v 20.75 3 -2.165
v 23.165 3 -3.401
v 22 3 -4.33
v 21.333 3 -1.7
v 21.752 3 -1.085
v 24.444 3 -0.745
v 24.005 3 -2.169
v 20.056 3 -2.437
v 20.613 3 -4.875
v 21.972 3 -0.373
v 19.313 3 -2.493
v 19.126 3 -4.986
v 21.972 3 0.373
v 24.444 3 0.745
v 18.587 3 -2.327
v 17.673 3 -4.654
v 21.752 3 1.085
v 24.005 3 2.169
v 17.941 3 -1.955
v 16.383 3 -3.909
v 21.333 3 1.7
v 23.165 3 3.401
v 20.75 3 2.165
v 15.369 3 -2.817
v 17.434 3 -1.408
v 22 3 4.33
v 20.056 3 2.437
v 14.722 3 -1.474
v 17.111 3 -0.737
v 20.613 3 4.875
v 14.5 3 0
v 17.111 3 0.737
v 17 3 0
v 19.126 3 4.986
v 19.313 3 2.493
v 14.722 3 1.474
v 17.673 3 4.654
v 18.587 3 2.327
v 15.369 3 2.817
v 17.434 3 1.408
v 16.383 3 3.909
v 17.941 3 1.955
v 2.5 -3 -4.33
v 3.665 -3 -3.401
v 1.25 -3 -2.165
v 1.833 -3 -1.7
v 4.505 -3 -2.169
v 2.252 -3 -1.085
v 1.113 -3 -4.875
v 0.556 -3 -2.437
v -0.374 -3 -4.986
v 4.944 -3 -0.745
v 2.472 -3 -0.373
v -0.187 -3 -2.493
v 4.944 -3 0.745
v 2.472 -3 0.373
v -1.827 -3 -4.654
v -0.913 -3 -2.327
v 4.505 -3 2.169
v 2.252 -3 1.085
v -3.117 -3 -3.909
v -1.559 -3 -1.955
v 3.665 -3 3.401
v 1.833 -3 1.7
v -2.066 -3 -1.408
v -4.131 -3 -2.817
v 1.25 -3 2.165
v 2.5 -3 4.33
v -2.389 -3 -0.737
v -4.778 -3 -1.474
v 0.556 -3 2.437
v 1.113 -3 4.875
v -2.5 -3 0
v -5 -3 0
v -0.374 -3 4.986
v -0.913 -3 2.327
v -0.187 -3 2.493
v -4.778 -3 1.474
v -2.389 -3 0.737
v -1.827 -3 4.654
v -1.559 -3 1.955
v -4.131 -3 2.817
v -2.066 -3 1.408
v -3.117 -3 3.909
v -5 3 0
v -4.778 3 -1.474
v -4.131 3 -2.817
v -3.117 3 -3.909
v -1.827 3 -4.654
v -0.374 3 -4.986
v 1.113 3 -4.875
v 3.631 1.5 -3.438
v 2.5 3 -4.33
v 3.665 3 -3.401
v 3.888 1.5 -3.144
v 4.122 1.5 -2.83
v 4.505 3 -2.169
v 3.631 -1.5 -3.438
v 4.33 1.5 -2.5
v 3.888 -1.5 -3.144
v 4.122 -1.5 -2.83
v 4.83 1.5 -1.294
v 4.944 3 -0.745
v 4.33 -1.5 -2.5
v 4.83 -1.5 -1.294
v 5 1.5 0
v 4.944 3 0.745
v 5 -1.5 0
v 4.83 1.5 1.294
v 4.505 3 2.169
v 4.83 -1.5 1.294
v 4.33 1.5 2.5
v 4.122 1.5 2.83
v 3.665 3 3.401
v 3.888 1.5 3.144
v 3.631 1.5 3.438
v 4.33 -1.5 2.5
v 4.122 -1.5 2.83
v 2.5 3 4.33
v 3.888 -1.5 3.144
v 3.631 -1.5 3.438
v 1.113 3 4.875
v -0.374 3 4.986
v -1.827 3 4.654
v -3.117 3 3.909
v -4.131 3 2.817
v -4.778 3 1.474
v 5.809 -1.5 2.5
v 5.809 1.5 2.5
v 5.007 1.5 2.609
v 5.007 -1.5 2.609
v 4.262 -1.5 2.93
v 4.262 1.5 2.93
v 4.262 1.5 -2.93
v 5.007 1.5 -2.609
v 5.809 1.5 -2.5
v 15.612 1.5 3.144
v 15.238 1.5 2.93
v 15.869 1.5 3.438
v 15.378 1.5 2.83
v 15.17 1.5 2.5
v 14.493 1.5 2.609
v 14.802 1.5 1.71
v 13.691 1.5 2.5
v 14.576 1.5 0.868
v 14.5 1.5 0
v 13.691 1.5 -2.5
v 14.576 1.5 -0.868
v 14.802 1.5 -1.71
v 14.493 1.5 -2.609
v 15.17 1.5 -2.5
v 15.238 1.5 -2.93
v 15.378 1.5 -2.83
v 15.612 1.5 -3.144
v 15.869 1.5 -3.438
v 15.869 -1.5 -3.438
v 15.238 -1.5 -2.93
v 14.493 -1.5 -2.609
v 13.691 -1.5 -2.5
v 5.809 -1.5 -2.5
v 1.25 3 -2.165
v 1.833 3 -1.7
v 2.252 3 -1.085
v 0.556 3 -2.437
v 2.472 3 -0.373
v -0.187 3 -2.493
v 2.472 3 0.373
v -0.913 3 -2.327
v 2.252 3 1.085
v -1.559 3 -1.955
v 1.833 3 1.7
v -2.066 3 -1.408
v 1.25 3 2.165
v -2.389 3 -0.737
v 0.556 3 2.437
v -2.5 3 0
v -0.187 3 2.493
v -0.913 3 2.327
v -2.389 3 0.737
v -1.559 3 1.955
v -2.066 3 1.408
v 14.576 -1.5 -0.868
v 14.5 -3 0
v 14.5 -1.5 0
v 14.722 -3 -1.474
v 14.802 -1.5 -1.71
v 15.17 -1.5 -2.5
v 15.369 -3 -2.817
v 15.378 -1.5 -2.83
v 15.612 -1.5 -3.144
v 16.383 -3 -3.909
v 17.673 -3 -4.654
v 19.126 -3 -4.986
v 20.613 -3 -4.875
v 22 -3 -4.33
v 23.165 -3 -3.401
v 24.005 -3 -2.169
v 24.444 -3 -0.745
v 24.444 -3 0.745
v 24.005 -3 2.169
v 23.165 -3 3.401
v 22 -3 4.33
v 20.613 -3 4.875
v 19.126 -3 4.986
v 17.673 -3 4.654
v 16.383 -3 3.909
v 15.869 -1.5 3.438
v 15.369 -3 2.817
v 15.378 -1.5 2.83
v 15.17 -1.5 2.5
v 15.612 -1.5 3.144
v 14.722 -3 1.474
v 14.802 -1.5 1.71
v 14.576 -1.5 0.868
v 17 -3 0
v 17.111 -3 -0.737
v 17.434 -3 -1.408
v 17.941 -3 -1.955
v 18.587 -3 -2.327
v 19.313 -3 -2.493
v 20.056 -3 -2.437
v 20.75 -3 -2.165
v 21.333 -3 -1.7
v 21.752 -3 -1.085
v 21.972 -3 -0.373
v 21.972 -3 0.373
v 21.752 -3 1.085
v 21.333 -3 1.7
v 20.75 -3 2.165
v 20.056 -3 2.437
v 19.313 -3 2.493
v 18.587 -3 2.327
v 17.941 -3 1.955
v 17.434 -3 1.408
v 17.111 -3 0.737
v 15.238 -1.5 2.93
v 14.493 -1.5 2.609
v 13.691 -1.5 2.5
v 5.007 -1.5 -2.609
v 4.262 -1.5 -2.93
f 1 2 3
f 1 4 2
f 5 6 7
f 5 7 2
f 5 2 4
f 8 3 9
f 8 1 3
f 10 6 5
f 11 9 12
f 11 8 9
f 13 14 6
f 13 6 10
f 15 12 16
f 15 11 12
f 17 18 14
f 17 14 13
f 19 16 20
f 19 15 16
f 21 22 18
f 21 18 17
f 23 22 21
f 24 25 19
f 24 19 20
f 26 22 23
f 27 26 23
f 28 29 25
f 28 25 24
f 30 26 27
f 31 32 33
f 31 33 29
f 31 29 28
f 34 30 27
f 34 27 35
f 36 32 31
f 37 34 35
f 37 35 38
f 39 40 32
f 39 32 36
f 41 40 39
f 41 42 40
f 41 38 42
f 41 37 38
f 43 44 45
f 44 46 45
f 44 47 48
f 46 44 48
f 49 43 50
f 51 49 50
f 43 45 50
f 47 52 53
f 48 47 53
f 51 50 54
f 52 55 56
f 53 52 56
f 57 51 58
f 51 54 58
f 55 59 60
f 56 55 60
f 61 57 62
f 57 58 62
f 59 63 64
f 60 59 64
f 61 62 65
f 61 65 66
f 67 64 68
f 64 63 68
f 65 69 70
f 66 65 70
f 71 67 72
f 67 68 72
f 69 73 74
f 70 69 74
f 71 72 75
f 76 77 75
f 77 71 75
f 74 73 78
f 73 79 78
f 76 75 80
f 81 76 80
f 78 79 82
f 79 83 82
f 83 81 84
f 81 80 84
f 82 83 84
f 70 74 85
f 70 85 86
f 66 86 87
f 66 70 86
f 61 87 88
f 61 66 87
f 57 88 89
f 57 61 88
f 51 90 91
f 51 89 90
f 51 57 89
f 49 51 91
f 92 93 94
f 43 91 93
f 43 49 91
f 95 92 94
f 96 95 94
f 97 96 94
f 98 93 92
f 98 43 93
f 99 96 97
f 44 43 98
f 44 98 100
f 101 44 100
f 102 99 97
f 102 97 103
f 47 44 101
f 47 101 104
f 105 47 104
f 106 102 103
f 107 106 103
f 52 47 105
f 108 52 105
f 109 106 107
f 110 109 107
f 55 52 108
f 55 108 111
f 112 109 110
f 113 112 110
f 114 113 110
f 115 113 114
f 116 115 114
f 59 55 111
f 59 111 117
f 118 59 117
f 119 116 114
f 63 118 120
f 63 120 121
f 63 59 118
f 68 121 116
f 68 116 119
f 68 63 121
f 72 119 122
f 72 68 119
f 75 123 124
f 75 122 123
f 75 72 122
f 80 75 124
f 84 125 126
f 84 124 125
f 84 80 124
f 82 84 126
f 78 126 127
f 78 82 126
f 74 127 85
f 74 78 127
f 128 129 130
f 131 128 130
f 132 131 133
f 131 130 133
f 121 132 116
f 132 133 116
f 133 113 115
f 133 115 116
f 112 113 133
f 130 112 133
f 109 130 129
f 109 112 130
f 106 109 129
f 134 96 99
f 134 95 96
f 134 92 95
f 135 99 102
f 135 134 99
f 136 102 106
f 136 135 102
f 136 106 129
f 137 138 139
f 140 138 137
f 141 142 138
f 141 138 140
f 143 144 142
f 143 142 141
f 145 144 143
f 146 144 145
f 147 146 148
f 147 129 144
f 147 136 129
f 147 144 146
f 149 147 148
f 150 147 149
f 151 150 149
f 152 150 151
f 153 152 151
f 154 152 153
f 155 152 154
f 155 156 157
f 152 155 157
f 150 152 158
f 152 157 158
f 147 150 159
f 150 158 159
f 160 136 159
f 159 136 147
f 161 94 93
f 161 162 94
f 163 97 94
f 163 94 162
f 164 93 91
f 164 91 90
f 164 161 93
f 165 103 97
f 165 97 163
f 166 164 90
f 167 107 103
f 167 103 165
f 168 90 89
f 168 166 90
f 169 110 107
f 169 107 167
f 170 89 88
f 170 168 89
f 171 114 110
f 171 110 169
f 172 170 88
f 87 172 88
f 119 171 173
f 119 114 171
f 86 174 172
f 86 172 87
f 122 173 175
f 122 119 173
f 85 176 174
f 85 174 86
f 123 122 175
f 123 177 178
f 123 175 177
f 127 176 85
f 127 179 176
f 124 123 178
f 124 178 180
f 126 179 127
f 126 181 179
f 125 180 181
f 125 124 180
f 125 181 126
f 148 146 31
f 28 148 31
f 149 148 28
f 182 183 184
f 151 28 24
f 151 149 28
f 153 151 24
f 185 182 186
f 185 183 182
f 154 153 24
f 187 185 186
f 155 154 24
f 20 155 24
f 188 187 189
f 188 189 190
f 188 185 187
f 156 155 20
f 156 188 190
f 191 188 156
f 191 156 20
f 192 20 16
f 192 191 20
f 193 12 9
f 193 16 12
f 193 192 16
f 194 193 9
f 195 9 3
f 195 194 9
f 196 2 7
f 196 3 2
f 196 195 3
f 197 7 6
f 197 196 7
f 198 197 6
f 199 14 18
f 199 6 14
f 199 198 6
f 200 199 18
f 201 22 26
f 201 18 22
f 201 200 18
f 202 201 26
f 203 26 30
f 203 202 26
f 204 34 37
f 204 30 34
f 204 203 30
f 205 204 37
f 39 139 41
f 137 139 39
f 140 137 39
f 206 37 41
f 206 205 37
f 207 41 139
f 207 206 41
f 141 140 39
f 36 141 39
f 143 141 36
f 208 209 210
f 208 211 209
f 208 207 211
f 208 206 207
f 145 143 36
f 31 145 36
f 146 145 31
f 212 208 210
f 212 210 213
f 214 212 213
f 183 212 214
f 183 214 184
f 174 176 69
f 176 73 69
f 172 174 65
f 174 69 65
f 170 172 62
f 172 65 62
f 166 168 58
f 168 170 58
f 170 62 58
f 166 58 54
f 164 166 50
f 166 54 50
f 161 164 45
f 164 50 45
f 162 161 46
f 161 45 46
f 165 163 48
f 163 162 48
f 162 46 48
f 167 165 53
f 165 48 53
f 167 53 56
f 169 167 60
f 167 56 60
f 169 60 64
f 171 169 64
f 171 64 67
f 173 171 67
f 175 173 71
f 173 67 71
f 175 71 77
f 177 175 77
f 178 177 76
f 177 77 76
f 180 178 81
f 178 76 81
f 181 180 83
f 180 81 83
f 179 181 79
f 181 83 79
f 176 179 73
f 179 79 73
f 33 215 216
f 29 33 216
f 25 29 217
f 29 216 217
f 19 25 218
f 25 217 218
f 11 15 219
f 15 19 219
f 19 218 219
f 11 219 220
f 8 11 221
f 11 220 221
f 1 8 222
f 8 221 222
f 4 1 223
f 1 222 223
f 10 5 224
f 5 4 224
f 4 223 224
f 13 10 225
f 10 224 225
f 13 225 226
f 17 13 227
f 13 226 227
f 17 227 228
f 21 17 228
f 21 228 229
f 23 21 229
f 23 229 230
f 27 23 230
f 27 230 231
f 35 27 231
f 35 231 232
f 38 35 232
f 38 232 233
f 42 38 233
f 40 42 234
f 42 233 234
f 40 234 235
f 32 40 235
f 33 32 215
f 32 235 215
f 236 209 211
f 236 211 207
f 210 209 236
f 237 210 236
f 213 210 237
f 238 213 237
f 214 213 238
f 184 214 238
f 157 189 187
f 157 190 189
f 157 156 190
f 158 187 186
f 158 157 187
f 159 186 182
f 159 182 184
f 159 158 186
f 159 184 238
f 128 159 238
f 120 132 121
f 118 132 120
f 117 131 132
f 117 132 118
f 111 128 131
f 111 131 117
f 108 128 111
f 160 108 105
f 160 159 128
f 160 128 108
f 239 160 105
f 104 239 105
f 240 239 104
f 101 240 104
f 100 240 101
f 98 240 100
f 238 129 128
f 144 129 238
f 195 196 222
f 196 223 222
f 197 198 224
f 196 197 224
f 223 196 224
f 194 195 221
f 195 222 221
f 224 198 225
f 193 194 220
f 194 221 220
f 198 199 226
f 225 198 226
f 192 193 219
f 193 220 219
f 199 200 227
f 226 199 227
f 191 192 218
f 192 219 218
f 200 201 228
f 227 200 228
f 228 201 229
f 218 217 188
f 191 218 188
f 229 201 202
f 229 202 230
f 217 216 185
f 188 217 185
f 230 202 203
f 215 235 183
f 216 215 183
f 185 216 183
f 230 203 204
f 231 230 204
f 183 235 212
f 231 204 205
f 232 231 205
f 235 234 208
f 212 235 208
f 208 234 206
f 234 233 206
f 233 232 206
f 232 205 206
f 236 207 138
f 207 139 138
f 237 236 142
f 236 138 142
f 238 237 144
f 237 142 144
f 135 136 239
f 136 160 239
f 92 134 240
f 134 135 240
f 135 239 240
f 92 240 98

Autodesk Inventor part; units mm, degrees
ref_plane "YZ Plane" through (0, 0, 0) normal (1, 0, 0) x (0, 1, 0)
ref_plane "XZ Plane" through (0, 0, 0) normal (0, 1, 0) x (-1, 0, 0)
ref_plane "XY Plane" through (0, 0, 0) normal (0, 0, 1) x (1, 0, 0)
sketch "Sketch1" plane through (0, 0, 0) normal (0, 1, 0) x (-1, 0, 0)
  circle A0 centre (0, 0) radius 5
  circle A1 centre (0, 0) radius 2.5
  dimension "d1" = 5
extrude "Extrusion1" add sketch "Sketch1" along normal mid plane 6
sketch "Sketch2" plane through (0, 0, 0) normal (0, 1, 0) x (-1, 0, 0)
  point P0 (0, 0)
sketch "Sketch3" plane through (0, 0, 0) normal (0, 1, 0) x (-1, 0, 0)
  circle A0 centre (-19.5, 0) radius 5
  circle A1 centre (-19.5, 0) radius 2.5
  point P0 (0, 0)
  dimension "d5" = 10
  dimension "d6" = 5
extrude "Extrusion2" add sketch "Sketch3" along normal mid plane 6
sketch "Sketch4" plane through (0, 0, 0) normal (0, 0, 1) x (1, 0, 0)
  line L0 (3.9419, 0) -> (16.4981, 0) construction
  line L1 (3.9419, 0) -> (3.9419, 1.5)
  line L2 (5, 3) -> (-5, 3) projected
  line L3 (3.9419, 0) -> (3.9419, -1.5)
  line L4 (3.9419, 1.5) -> (16.0281, 1.5)
  line L5 (16.0281, 1.5) -> (16.0281, -1.5)
  line L6 (16.0281, -1.5) -> (3.9419, -1.5)
  line L7 (2.5, -3) -> (2.5, 3) projected
  point P0 (0, 0)
extrude "Extrusion3" add sketch "Sketch4" along normal mid plane 5
fillet "Fillet1" radius 3 4 edges at (4.3301, 0, -2.5) (15.1699, 0, -2.5) (15.1699, 0, 2.5) (4.3301, 0, 2.5)
properties part number "Bielletta"
